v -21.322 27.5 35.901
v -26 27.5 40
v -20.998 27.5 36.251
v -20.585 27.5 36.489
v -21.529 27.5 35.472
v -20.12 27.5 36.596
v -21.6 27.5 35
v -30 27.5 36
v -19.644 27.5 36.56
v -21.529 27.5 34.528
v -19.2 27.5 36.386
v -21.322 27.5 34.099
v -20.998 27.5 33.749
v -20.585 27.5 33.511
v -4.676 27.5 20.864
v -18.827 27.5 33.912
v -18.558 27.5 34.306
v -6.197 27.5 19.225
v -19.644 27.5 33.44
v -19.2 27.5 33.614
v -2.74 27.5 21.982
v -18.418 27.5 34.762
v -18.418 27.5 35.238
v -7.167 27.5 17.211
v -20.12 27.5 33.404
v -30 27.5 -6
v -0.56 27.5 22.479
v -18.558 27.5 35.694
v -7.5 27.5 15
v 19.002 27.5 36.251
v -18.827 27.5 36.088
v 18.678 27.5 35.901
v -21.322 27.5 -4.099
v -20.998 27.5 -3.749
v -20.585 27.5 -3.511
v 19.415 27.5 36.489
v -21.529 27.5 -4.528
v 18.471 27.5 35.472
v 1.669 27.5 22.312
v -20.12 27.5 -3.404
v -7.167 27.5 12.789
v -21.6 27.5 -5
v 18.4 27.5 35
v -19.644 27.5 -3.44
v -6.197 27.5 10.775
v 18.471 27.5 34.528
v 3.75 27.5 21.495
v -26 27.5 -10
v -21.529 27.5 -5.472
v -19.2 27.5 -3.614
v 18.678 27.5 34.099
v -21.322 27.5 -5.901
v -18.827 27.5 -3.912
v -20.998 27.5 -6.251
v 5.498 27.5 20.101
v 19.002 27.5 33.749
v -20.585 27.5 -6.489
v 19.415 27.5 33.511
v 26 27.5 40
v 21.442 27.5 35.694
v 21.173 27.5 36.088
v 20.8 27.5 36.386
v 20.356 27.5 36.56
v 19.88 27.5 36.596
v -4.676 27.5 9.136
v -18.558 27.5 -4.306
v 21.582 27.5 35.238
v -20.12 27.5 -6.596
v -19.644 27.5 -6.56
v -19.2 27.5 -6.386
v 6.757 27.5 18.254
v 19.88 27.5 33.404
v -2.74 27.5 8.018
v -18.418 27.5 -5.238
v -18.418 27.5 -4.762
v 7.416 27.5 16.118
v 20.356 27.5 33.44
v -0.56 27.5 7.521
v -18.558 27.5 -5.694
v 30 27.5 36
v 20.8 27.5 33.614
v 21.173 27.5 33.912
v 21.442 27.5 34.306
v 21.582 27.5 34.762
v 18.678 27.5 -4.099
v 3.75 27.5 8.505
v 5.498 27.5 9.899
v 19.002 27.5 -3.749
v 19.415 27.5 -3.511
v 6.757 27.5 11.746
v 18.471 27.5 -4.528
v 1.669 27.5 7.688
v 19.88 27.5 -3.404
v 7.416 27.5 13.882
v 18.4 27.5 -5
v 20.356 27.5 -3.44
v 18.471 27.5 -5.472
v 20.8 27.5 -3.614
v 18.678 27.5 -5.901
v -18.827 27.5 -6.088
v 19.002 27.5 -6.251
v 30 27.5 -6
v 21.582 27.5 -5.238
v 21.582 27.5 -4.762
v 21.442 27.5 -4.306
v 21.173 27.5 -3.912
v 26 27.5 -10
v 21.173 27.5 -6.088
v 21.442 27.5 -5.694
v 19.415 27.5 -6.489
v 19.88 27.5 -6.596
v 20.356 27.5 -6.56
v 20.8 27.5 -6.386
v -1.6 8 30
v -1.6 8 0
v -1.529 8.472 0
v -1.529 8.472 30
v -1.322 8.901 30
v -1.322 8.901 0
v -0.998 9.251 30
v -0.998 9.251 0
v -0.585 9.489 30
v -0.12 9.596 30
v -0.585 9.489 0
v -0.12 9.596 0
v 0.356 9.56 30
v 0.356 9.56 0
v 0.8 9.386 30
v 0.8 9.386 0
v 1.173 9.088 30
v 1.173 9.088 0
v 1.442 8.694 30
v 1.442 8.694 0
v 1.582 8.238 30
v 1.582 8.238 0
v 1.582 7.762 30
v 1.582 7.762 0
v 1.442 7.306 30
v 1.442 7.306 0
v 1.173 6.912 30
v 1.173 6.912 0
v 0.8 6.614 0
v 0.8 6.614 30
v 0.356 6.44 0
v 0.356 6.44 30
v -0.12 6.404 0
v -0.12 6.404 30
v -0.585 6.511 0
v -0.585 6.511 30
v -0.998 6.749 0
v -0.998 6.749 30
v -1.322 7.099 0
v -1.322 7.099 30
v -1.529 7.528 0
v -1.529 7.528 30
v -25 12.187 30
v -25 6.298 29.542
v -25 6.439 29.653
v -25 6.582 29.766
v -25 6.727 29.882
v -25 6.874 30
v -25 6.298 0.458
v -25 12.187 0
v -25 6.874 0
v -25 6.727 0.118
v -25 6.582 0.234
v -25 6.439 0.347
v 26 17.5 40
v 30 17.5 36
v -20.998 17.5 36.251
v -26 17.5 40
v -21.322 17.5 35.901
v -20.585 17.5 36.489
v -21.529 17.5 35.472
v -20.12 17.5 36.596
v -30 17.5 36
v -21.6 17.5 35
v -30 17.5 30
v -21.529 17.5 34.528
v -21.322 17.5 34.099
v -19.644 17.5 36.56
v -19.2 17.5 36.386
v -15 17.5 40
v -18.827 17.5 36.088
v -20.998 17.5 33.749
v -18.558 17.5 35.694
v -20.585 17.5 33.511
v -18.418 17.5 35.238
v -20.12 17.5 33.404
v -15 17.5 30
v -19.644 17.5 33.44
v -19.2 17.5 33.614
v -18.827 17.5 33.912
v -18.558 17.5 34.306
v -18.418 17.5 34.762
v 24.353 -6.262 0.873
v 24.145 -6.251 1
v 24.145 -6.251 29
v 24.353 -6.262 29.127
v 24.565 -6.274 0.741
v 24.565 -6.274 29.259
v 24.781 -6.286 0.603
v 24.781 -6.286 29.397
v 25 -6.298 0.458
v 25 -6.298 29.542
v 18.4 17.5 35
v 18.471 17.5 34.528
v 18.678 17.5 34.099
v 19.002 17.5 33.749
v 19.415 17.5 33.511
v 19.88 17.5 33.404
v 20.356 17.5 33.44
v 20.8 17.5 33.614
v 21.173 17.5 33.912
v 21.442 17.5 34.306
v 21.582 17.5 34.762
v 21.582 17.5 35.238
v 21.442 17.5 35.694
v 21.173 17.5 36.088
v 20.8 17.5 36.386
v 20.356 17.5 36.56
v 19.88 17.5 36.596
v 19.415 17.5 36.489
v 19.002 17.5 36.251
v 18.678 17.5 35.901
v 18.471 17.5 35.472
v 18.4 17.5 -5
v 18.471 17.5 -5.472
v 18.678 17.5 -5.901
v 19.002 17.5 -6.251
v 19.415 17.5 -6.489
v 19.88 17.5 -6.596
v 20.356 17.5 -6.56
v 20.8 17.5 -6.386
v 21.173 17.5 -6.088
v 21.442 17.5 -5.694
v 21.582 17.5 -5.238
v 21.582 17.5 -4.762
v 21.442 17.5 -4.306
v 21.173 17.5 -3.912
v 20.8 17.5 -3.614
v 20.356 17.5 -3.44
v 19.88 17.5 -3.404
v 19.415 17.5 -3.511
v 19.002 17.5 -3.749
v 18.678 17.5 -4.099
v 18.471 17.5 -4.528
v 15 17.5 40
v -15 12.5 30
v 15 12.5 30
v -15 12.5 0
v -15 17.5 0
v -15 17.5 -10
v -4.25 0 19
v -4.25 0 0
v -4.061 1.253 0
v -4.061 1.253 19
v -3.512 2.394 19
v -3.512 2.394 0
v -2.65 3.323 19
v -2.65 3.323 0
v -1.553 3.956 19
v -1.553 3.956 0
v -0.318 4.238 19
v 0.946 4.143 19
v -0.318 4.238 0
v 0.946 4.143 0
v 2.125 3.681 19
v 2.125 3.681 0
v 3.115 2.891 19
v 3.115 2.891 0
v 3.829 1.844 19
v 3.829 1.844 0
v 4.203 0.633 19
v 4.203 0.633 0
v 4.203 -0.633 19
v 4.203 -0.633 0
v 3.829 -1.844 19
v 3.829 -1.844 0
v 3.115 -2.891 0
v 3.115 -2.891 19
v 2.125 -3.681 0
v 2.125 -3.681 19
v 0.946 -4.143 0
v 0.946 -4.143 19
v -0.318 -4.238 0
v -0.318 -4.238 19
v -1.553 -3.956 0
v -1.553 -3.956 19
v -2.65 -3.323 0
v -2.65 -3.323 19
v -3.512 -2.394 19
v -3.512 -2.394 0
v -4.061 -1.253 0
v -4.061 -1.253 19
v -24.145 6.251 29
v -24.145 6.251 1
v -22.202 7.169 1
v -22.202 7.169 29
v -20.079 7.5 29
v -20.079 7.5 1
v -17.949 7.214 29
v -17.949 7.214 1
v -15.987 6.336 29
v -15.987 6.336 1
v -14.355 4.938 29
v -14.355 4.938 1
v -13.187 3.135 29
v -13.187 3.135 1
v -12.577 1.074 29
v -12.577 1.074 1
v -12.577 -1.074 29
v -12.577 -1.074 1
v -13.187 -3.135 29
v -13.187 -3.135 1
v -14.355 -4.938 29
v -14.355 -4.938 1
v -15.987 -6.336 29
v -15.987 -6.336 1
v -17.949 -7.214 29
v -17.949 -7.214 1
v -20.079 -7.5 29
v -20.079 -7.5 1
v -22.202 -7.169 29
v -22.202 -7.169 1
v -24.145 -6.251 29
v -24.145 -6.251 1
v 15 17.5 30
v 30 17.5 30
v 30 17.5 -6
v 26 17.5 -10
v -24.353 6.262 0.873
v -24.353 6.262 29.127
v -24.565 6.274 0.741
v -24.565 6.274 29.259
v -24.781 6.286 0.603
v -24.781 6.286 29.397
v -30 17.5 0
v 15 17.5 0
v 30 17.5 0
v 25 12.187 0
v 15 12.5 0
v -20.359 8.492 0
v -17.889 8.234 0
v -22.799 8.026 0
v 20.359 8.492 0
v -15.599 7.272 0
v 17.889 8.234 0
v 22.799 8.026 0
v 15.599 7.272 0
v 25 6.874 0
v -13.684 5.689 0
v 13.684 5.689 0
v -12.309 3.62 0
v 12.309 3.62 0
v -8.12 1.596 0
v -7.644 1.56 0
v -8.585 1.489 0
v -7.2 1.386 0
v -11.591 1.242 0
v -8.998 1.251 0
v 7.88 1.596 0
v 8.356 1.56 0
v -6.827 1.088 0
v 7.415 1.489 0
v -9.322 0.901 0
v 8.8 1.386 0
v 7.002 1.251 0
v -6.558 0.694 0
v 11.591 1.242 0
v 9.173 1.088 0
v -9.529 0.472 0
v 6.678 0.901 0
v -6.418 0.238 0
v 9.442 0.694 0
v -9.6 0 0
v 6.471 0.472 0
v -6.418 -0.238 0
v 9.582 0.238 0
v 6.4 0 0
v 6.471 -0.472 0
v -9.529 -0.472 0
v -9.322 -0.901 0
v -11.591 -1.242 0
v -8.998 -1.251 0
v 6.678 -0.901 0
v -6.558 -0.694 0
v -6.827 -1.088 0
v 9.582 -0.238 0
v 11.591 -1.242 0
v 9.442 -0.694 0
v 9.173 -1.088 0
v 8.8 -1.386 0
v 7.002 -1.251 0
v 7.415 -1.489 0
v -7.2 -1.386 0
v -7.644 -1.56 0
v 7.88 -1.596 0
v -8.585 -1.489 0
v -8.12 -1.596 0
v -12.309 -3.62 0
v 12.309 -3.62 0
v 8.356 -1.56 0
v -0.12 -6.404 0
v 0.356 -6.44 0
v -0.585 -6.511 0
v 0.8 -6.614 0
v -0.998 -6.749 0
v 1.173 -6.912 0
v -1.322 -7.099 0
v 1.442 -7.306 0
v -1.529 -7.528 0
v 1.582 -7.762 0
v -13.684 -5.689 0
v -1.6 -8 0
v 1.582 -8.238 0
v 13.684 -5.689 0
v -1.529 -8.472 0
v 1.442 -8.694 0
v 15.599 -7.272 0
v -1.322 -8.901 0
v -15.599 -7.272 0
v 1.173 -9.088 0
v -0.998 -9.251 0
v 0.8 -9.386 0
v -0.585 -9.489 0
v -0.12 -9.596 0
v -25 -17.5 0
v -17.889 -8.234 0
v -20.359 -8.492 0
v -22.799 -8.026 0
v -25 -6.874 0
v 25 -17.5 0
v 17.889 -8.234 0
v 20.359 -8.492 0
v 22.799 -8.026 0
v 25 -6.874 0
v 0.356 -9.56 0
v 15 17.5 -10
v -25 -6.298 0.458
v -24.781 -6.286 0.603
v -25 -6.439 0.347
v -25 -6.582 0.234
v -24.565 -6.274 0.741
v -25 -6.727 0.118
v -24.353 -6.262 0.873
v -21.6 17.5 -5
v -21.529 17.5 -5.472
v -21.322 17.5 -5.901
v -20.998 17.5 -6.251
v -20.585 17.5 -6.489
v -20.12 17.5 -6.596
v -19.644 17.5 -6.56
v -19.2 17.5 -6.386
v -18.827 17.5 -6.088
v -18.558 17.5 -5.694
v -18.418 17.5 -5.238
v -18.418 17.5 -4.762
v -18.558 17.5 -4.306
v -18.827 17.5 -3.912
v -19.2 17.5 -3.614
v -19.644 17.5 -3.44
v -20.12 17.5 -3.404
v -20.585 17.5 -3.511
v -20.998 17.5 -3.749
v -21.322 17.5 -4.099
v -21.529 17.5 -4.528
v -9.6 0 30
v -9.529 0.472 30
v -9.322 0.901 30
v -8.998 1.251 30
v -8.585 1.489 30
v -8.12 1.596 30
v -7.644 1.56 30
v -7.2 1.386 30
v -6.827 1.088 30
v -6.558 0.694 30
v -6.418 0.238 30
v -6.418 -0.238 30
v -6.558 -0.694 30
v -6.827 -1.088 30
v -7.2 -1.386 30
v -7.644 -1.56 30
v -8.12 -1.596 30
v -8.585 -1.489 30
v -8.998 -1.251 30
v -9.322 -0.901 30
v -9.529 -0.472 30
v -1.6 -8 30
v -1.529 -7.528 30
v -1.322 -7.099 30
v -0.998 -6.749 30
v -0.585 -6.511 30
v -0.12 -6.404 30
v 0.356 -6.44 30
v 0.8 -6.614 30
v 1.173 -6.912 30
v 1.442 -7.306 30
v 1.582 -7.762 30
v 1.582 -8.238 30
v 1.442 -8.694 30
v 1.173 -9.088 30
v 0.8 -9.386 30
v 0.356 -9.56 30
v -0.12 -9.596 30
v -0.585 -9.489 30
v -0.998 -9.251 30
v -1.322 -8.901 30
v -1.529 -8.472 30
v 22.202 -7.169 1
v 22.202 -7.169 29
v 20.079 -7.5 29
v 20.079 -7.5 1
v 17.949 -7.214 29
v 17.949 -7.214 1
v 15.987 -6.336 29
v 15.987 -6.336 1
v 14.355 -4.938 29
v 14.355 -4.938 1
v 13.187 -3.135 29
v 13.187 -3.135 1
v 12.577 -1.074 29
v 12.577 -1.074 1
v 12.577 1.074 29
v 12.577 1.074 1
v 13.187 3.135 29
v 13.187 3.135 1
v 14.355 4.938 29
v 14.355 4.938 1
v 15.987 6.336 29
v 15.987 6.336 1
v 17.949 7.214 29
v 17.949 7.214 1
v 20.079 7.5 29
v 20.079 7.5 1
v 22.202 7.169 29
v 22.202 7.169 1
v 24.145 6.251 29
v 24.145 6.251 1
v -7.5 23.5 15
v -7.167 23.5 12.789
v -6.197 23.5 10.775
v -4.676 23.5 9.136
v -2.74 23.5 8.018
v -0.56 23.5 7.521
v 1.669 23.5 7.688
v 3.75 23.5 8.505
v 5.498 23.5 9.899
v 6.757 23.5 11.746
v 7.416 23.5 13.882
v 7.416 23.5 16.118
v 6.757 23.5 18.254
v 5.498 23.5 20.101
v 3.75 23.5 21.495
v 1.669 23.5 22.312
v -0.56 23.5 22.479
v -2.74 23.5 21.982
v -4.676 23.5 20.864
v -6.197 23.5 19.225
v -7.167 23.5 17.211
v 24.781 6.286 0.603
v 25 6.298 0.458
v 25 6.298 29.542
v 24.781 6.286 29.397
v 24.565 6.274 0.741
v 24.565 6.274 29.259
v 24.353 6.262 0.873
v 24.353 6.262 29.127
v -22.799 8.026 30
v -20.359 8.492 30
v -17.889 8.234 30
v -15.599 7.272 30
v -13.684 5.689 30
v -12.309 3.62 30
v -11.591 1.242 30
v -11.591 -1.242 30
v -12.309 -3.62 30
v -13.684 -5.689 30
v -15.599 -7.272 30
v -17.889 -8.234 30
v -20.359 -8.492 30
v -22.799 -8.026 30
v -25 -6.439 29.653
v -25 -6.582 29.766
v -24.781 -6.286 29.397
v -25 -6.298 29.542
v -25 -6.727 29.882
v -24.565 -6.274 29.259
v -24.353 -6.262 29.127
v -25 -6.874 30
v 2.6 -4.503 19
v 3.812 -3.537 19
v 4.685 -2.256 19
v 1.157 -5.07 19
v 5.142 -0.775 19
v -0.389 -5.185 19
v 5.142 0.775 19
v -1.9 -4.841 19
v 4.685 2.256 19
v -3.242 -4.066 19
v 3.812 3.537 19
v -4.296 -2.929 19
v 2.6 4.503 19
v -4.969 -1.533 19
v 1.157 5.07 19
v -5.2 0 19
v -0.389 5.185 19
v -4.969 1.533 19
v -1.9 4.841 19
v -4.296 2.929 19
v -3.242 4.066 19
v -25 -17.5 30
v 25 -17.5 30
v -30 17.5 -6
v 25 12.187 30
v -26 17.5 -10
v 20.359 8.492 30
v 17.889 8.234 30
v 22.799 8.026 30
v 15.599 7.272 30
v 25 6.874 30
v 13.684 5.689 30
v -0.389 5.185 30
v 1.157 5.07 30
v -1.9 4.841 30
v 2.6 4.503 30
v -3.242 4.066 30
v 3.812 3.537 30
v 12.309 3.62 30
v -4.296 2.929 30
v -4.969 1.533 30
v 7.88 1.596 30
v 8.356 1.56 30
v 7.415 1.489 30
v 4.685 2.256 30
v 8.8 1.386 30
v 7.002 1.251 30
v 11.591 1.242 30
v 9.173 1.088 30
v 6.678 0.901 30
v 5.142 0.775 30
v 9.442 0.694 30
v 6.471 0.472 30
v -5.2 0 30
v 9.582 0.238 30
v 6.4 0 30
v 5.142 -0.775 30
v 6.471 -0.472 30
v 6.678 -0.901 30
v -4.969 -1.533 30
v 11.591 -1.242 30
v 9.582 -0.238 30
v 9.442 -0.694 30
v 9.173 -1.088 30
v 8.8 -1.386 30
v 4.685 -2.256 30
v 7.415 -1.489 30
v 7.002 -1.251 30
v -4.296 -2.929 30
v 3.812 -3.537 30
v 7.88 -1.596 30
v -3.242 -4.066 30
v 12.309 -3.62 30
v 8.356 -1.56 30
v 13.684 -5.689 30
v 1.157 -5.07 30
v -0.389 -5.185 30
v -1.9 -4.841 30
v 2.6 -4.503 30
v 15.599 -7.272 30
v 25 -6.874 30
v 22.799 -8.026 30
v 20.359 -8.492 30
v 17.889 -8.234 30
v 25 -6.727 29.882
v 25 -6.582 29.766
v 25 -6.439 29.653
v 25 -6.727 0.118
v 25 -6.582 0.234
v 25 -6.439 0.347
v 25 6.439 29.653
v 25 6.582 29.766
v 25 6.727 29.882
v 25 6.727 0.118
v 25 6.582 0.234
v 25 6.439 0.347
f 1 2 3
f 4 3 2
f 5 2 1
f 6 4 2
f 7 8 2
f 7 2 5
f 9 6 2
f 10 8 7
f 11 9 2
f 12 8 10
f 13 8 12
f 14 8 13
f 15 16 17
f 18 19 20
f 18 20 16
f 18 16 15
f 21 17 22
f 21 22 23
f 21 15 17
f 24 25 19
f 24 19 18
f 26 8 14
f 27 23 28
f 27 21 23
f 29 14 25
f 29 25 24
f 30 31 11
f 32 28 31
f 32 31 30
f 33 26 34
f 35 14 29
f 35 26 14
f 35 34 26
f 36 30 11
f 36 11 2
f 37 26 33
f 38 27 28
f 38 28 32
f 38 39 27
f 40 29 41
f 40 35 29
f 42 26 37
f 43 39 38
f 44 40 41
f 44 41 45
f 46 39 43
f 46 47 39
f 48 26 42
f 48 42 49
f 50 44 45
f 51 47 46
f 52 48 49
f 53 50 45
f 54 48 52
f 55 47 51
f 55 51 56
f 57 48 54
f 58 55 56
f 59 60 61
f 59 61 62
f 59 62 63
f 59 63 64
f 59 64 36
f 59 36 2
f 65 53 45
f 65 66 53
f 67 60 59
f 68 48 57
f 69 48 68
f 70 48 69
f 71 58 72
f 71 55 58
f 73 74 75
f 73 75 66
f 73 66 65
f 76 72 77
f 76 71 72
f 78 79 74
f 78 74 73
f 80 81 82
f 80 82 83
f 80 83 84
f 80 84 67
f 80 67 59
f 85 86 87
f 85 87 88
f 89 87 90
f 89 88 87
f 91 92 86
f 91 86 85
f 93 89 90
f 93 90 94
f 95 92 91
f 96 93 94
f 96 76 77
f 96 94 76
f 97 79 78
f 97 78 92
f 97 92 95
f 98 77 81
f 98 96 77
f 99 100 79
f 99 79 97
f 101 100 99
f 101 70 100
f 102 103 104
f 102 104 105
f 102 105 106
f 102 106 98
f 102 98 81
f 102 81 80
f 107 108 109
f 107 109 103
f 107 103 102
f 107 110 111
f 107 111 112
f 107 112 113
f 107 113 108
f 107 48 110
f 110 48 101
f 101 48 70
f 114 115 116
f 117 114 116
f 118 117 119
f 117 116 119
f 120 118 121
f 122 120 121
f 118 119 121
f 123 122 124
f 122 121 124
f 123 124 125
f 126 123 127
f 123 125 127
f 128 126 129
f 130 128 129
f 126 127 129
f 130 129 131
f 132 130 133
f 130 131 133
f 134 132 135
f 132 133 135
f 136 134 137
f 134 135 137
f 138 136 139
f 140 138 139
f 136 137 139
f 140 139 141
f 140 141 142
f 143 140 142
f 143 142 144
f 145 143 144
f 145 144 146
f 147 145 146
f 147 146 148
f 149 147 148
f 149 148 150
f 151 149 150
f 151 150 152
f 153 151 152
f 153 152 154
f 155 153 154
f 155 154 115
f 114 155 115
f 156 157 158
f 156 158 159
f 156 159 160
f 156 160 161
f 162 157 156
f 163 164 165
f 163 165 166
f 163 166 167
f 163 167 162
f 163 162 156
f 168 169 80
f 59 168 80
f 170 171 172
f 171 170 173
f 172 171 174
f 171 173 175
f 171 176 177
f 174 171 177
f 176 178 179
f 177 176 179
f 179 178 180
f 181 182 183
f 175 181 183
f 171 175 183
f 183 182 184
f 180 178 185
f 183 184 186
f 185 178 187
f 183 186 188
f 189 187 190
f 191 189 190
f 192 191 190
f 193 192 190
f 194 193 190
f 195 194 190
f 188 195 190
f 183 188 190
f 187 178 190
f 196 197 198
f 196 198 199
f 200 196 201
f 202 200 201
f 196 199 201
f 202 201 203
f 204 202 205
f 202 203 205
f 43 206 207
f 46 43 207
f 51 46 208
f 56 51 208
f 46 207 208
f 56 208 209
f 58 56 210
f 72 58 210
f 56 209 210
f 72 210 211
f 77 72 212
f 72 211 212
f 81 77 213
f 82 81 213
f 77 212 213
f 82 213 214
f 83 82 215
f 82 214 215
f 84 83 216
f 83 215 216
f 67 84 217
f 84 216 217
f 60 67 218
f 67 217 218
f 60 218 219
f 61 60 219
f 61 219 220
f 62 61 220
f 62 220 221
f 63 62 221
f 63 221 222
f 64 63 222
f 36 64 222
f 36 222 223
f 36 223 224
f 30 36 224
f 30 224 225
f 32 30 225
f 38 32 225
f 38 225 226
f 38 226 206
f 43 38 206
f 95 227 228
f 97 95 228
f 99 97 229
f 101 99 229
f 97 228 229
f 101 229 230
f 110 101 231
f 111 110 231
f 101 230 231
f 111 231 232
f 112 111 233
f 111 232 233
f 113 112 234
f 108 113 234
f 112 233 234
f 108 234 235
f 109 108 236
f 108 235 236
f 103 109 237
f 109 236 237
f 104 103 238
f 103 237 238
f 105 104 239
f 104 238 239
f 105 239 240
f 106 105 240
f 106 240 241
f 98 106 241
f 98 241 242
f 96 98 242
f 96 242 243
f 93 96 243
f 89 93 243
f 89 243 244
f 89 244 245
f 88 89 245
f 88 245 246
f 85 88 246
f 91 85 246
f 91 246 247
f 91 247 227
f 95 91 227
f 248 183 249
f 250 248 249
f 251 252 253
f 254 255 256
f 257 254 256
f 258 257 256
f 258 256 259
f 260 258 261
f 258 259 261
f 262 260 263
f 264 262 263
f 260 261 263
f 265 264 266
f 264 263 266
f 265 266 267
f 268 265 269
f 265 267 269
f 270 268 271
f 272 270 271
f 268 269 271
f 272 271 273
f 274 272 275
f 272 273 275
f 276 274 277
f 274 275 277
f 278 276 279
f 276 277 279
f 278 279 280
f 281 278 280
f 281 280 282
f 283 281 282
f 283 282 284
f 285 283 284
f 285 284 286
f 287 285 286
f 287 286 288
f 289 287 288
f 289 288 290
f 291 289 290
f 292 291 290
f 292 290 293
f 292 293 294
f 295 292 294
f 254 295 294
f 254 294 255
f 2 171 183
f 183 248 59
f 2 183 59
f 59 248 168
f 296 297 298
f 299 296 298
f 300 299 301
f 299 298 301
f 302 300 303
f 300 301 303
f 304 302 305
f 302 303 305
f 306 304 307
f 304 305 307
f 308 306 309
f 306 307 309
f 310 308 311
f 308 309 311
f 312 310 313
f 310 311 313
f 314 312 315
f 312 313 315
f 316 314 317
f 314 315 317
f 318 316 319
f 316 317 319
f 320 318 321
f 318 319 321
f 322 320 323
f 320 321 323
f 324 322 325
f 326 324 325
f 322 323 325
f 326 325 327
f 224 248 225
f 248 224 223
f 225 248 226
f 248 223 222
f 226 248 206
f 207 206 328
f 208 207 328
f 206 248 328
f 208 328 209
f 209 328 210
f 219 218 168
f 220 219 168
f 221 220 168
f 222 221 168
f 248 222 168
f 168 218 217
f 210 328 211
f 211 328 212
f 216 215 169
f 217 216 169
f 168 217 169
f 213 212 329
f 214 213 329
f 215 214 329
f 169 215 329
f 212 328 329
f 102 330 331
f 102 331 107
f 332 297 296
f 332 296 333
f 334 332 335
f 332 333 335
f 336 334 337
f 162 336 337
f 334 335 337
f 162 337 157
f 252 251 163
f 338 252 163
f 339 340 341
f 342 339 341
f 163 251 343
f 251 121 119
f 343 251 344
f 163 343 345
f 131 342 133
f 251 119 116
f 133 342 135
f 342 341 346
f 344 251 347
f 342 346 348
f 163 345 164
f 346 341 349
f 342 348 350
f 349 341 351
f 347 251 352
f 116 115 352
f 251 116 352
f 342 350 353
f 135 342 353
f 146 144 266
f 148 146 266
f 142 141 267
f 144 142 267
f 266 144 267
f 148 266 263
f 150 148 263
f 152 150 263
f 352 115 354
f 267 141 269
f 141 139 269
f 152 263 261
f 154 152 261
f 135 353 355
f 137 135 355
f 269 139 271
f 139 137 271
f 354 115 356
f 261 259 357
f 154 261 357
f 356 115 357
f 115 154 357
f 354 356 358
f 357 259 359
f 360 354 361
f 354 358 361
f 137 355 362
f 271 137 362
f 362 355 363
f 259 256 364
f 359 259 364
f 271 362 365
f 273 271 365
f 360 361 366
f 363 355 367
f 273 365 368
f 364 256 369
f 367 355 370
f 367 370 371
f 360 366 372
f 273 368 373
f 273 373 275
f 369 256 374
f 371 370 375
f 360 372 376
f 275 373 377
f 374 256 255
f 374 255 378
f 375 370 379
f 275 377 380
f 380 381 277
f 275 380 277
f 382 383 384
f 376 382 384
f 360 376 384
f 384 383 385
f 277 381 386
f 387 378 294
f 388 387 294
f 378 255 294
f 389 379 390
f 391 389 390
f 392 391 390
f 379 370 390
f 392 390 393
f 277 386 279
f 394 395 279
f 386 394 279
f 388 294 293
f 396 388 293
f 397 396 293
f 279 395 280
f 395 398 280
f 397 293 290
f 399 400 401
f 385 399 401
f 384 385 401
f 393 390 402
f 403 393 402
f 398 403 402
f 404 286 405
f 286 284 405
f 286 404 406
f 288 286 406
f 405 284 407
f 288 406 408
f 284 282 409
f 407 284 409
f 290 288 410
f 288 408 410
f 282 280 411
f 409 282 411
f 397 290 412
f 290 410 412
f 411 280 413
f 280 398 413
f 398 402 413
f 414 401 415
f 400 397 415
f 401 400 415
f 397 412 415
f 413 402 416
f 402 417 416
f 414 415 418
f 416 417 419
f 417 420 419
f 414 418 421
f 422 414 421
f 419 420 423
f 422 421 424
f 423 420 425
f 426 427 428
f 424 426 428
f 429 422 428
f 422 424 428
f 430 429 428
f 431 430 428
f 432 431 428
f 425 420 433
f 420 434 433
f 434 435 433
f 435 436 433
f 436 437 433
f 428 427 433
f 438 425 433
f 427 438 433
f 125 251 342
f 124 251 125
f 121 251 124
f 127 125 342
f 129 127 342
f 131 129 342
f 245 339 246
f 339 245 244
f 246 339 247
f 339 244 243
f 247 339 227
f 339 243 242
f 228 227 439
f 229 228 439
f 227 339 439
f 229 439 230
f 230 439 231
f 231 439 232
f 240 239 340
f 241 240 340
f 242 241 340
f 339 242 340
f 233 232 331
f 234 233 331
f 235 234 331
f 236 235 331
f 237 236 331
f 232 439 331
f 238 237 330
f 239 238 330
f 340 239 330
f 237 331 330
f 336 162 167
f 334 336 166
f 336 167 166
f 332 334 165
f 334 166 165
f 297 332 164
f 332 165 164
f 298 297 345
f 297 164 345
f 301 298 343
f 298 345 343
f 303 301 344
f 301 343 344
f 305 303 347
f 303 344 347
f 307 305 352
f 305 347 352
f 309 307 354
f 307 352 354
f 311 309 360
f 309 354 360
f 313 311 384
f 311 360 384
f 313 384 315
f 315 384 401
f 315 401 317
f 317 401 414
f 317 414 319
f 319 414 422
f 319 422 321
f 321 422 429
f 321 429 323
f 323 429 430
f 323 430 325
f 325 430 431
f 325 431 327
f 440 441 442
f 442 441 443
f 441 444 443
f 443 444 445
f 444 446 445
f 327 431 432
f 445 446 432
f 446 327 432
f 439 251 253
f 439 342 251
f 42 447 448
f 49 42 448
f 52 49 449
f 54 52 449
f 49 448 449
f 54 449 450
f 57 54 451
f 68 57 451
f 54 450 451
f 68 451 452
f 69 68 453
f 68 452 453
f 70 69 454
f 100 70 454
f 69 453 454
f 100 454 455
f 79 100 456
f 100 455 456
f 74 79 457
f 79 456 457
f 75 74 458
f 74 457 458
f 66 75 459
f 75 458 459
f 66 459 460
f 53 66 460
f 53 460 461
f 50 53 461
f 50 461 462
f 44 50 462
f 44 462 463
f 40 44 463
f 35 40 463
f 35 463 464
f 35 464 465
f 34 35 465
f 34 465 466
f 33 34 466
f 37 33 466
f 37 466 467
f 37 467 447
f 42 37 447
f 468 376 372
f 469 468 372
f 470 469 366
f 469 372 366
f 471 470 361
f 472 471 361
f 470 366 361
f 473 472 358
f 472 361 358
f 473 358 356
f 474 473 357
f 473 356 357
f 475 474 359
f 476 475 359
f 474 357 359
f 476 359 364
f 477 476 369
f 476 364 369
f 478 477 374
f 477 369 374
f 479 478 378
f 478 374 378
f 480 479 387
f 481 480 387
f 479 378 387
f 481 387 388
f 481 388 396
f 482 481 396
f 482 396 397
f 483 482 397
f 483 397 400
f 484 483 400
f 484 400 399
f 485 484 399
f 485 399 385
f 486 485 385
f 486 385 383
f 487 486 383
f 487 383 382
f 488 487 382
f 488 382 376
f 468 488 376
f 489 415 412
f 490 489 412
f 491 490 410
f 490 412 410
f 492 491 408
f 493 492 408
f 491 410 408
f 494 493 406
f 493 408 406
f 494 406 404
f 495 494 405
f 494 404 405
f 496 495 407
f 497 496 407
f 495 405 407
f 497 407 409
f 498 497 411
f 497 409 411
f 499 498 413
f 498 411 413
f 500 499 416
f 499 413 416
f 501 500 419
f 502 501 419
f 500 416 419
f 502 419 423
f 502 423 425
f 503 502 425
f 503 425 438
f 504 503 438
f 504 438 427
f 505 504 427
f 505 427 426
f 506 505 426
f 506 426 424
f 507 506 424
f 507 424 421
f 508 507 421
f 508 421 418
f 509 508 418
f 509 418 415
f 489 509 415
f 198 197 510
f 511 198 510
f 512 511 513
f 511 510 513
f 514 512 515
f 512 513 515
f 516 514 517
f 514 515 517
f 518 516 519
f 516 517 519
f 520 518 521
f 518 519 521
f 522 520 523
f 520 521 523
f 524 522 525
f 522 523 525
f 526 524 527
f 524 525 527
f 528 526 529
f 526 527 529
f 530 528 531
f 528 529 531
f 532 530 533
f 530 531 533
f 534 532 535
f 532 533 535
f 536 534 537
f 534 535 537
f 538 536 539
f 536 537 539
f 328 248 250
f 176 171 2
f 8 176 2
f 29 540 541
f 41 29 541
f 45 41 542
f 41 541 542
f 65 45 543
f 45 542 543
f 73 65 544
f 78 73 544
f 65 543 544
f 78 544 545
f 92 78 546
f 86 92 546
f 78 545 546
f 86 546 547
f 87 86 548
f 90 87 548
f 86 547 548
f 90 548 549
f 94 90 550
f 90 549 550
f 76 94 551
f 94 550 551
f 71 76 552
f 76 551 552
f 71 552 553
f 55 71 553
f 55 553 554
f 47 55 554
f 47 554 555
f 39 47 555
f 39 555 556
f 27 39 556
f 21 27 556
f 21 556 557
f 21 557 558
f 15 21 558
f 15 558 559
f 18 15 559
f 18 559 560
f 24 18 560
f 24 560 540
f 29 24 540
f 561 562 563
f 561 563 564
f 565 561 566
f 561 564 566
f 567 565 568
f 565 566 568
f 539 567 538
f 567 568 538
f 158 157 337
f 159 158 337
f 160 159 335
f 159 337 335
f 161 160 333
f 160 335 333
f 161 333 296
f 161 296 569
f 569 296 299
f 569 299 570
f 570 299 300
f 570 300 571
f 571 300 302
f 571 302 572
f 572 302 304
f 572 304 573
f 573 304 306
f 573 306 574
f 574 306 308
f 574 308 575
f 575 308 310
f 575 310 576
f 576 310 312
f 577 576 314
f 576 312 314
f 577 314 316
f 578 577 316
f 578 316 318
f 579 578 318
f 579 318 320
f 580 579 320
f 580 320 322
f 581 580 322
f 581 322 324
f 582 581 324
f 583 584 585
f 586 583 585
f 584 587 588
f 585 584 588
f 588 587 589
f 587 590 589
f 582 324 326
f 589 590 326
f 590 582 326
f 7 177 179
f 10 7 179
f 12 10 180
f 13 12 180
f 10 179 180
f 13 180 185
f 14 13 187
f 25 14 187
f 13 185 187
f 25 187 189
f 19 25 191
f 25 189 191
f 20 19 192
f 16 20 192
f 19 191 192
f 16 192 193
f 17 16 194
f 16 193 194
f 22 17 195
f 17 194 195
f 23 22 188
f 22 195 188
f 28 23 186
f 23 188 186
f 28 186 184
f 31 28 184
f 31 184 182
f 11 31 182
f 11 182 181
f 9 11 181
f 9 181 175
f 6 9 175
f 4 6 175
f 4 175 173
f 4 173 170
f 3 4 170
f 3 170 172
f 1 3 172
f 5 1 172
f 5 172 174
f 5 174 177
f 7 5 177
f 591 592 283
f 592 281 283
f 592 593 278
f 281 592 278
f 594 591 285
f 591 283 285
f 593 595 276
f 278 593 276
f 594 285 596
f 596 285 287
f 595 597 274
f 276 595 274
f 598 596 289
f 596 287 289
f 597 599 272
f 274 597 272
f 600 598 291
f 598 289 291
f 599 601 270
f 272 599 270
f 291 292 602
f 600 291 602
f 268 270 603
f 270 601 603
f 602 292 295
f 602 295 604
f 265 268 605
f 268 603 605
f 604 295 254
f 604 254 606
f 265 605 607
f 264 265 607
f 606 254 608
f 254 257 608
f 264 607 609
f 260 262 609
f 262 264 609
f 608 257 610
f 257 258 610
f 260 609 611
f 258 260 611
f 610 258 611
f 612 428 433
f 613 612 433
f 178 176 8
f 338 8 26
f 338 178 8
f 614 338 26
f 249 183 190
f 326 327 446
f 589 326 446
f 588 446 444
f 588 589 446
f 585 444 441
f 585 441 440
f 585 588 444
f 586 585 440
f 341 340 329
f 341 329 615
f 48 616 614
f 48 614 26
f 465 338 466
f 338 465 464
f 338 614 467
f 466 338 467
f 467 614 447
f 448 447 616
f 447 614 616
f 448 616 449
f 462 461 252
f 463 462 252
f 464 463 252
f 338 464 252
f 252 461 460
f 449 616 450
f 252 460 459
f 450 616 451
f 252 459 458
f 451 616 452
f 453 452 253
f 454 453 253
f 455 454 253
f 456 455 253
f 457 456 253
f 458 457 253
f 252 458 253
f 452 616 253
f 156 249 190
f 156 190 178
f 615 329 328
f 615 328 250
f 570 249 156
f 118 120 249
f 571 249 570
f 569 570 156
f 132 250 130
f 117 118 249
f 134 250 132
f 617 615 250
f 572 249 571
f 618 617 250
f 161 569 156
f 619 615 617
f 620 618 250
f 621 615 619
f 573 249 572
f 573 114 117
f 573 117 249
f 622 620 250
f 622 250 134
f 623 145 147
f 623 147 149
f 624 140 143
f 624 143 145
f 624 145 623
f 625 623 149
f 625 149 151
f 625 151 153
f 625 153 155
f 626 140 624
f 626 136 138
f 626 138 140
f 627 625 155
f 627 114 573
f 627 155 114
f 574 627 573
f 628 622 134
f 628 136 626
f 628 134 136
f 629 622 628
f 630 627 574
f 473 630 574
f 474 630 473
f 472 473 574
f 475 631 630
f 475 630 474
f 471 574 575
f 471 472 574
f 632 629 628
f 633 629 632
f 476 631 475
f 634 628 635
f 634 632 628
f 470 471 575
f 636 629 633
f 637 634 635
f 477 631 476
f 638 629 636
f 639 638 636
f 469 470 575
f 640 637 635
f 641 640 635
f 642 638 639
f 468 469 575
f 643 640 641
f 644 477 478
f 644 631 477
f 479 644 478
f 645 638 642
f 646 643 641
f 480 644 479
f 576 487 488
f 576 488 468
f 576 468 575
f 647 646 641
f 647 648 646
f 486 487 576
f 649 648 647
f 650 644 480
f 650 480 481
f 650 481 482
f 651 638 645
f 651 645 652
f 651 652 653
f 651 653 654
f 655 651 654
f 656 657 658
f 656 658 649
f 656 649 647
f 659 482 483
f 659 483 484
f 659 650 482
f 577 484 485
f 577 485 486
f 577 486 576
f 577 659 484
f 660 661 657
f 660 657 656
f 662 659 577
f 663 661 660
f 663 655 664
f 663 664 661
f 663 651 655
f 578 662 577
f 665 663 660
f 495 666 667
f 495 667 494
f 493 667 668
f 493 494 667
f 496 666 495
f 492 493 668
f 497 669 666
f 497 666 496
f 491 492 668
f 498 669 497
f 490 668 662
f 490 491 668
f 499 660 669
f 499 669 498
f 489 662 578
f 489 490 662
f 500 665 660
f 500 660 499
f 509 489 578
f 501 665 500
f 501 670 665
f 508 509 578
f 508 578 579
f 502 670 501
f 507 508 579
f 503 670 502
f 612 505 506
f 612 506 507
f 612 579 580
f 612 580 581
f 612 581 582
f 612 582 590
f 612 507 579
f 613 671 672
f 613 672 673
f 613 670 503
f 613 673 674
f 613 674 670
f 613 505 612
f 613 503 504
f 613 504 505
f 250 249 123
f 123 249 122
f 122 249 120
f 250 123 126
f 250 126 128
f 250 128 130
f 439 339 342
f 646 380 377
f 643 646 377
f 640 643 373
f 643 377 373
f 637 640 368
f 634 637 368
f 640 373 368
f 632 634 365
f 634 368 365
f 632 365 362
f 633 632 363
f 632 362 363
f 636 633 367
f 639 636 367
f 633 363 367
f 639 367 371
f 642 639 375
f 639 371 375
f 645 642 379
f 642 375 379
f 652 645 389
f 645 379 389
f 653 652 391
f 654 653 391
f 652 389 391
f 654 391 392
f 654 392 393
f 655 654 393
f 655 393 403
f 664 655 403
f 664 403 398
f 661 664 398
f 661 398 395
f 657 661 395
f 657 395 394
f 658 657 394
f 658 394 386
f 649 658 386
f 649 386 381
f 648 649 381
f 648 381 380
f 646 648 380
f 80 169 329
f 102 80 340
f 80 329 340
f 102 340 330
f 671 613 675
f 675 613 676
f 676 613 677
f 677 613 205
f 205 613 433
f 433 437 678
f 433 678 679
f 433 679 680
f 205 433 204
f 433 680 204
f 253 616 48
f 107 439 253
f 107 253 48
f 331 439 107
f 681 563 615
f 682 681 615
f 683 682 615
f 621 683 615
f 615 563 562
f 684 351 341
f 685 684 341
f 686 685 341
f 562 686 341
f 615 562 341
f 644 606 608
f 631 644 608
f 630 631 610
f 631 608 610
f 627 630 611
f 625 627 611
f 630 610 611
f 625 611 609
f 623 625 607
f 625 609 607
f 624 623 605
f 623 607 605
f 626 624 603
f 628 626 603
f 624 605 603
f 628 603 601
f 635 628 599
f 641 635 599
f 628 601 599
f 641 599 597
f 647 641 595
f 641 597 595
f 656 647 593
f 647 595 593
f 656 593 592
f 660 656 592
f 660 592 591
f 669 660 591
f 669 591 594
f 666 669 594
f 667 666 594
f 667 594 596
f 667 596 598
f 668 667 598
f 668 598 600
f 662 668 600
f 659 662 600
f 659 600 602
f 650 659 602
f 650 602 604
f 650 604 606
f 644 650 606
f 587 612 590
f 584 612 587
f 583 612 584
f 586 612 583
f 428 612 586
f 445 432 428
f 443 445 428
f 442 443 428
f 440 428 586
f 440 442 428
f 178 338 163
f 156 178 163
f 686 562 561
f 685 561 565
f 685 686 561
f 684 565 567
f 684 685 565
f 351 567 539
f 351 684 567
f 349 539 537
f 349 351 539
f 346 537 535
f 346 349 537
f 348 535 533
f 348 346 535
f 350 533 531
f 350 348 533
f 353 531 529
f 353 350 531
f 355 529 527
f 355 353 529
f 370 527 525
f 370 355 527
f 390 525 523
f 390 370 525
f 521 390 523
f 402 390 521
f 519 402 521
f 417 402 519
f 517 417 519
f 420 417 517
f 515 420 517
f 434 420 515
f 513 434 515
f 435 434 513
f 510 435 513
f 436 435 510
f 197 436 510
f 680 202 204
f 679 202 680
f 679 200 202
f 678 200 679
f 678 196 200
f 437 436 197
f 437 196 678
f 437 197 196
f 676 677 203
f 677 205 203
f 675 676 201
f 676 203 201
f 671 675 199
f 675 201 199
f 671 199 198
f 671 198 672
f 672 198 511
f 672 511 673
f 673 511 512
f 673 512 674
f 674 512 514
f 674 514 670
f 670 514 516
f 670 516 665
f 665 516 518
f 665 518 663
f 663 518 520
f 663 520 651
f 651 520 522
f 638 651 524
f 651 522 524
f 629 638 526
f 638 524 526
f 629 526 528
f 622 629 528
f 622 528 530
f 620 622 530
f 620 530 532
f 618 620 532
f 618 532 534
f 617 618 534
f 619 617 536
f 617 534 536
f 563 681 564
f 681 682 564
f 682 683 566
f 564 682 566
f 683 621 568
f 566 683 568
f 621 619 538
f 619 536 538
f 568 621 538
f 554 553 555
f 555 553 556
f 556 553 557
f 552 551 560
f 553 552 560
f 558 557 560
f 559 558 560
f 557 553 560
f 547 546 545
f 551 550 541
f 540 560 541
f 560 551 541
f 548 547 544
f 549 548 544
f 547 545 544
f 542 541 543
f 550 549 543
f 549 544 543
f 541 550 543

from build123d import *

# Parameters (mm, degrees)
SKETCH_1_W          = 50
SKETCH_1_H          = 35
EXTRUDE_1_DEPTH     = 30
HOLE_WIZARD_360_D   = 8.5
HOLE_WIZARD_465_D   = 3.2
HOLE_WIZARD_619_D   = 15
CHAMFER_1_SIZE      = 1
CHAMFER_1_SIZE_2    = 0.708203932
HOLE_WIZARD_1_D     = 10.4
HOLE_WIZARD_1_DEPTH = 11
SKETCH_11_W         = 60
SKETCH_11_H         = 50
EXTRUDE_3_DEPTH     = 10
HOLE_WIZARD_2_D     = 3.2
CHAMFER_2_SIZE      = 4
HOLE_WIZARD_3_D     = 15
HOLE_WIZARD_3_DEPTH = 4
EXTRUDE_4_DEPTH     = 15
RIB_22_REACH        = 49.762
SKETCH_19_WALL_W    = 104.820665624
SKETCH_19_WALL_H    = 30


with BuildPart() as part:
    # 草图1 → 凸台-拉伸1 (new body)
    with BuildSketch(Plane.XY):
        Rectangle(SKETCH_1_W, SKETCH_1_H)
    extrude(amount=EXTRUDE_1_DEPTH)

    # Hole Wizard 360 (through all)
    with Locations(Plane.XY.offset(30)):
        with Locations((0, 0)):
            Hole(HOLE_WIZARD_360_D / 2)

    # Hole Wizard 465 (through all)
    with Locations(Plane.XY.offset(30)):
        with Locations((8, 0), (0, 8), (-8, 0), (0, -8)):
            Hole(HOLE_WIZARD_465_D / 2)

    # Hole Wizard 619 (through all)
    with Locations(Plane.XY.offset(30)):
        with Locations((20, 0), (-20, 0)):
            Hole(HOLE_WIZARD_619_D / 2)

    # 倒角1
    # the kernel refuses this chamfer: 1, 0.708203932 mm, written as the material it takes off along each edge
    with BuildSketch(Plane(origin=(-20, 0, 0), x_dir=(-0.8790200859122482, 0.4767847402789059, 0), z_dir=(-0.4767847402789059, -0.8790200859122482, 0))) as chamfer_1_piece_1:
        Polygon((7.5, -CHAMFER_1_SIZE), (7.5 + CHAMFER_1_SIZE, 0), (7.5, 0), align=None)
    revolve(axis=Axis((-20, 0, 0), (0, 0, -1)), revolution_arc=303.048763938, mode=Mode.SUBTRACT)
    with BuildSketch(Plane(origin=(-20, 0, 30), x_dir=(-0.879020085912248, 0.47678474027890627, 0), z_dir=(-0.47678474027890627, -0.879020085912248, 0))) as chamfer_1_piece_2:
        Polygon((7.5 + CHAMFER_1_SIZE, 0), (7.5, CHAMFER_1_SIZE), (7.5, 0), align=None)
    revolve(axis=Axis((-20, 0, 30), (0, 0, -1)), revolution_arc=303.048763938, mode=Mode.SUBTRACT)
    with BuildSketch(Plane(origin=(20, 0, 30), x_dir=(0.879020085912248, -0.4767847402789061, 0), z_dir=(0.4767847402789061, 0.879020085912248, 0))) as chamfer_1_piece_3:
        Polygon((7.5 + CHAMFER_1_SIZE, 0), (7.5, CHAMFER_1_SIZE), (7.5, 0), align=None)
    revolve(axis=Axis((20, 0, 30), (0, 0, -1)), revolution_arc=303.048763938, mode=Mode.SUBTRACT)
    with BuildSketch(Plane(origin=(20, 0, 0), x_dir=(0.8790200859122481, 0.476784740278906, 0), z_dir=(0.476784740278906, -0.8790200859122481, 0))) as chamfer_1_piece_4:
        Polygon((7.5, CHAMFER_1_SIZE), (7.5 + CHAMFER_1_SIZE, 0), (7.5, 0), align=None)
    revolve(axis=Axis((20, 0, 0), (0, 0, 1)), revolution_arc=303.048763938, mode=Mode.SUBTRACT)
    with BuildSketch(Plane(origin=(-25, 5.590169944, 32.778051389), x_dir=(0.7914486393779661, 0.611235675682274, 0), z_dir=(0, 0, -1)), Plane(origin=(25, -5.590169944, 32.778051389), x_dir=(-0.7914486393779661, -0.611235675682274, 0), z_dir=(0, 0, -1))) as chamfer_1_piece_5:
        with BuildLine():
            Line((1.080663788, 0), (CHAMFER_1_SIZE_2 * 0.611235676113, -CHAMFER_1_SIZE_2 * 0.791448639936))
            Line((CHAMFER_1_SIZE_2 * 0.611235676113, -CHAMFER_1_SIZE_2 * 0.791448639936), (0, 0))
            ThreePointArc((0, 0), (0.555522087, -0.019473843), (1.080663788, 0))
        make_face()
    extrude(amount=35.556102778, mode=Mode.SUBTRACT)
    with BuildSketch(Plane(origin=(-25, -5.590169944, 32.778051389), x_dir=(0.7914486393779665, -0.6112356756822735, 0), z_dir=(0, 0, -1))) as chamfer_1_piece_6:
        with BuildLine():
            Line((1.080663788, 0), (CHAMFER_1_SIZE_2 * 0.611235676113, CHAMFER_1_SIZE_2 * 0.791448639936))
            Line((CHAMFER_1_SIZE_2 * 0.611235676113, CHAMFER_1_SIZE_2 * 0.791448639936), (0, 0))
            ThreePointArc((0, 0), (0.555522087, 0.019473843), (1.080663788, 0))
        make_face()
    extrude(amount=35.556102778, mode=Mode.SUBTRACT)
    with BuildSketch(Plane(origin=(25, 5.590169944, 32.778051389), x_dir=(0, 1, 0), z_dir=(0, 0, -1))) as chamfer_1_piece_7:
        with BuildLine():
            Line((CHAMFER_1_SIZE_2, 0), (0.660540261, -0.855289885))
            ThreePointArc((0.660540261, -0.855289885), (0.354967464, -0.427764092), (0, 0))
            Line((0, 0), (CHAMFER_1_SIZE_2, 0))
        make_face()
    extrude(amount=35.556102778, mode=Mode.SUBTRACT)

    # 孔1
    with Locations(Plane.XY.offset(30)):
        with Locations((0, 0)):
            Hole(HOLE_WIZARD_1_D / 2, depth=HOLE_WIZARD_1_DEPTH)

    # 草图11 → 凸台-拉伸3 (add)
    with BuildSketch(Plane(origin=(0, 17.5, 0), x_dir=(1, 0, 0), z_dir=(0, 1, 0))):
        with Locations((0, -15)):
            Rectangle(SKETCH_11_W, SKETCH_11_H)
    extrude(amount=EXTRUDE_3_DEPTH)

    # 孔2 (through all)
    with Locations(Plane(origin=(0, 27.5, 0), x_dir=(1, 0, 0), z_dir=(0, 1, 0))):
        with Locations((-20, 5), (20, 5), (20, -35), (-20, -35)):
            Hole(HOLE_WIZARD_2_D / 2)

    # 倒角2
    chamfer_2_edges = [part.edges().sort_by_distance(p)[0] for p in [
        (30, 22.5, 40),
        (30, 22.5, -10),
        (-30, 22.5, -10),
        (-30, 22.5, 40),
    ]]
    chamfer(chamfer_2_edges, length=CHAMFER_2_SIZE)

    # 孔3
    with Locations(Plane(origin=(0, 27.5, 0), x_dir=(1, 0, 0), z_dir=(0, 1, 0))):
        with Locations((0, -15)):
            Hole(HOLE_WIZARD_3_D / 2, depth=HOLE_WIZARD_3_DEPTH)

    # 草图16 → 凸台-拉伸4 (add, symmetric)
    with BuildSketch(Plane(origin=(0, 0, 0), x_dir=(0, 0, -1), z_dir=(1, 0, 0))):
        Polygon((-40, 17.5), (-30, 12.5), (-30, 17.5), align=None)
        Polygon((10, 17.5), (0, 17.5), (0, 12.5), align=None)
    extrude(amount=EXTRUDE_4_DEPTH, both=True)

    # 草图19 wall → 筋22 (add, up to next)
    with BuildSketch(Plane(origin=(-27.5, 14.843465885, 15), x_dir=(0.685325827281, -0.728236575888, 0), z_dir=(0.728236575888, 0.685325827281, 0)), mode=Mode.PRIVATE) as rib_22_sk1:
        Rectangle(SKETCH_19_WALL_W, SKETCH_19_WALL_H)
    rib_22_tool1 = extrude(rib_22_sk1.sketch, amount=RIB_22_REACH, mode=Mode.PRIVATE) - part.part
    rib_22 = rib_22_tool1.solids().sort_by_distance((-27.5, 14.843465885, 15))[0]
    add(rib_22)

    # 镜向1: 筋22 across plane
    add(rib_22.mirror(Plane(origin=(0, 0, 0), x_dir=(0, 0, 1), z_dir=(1, 0, 0))))


solid = part.part
